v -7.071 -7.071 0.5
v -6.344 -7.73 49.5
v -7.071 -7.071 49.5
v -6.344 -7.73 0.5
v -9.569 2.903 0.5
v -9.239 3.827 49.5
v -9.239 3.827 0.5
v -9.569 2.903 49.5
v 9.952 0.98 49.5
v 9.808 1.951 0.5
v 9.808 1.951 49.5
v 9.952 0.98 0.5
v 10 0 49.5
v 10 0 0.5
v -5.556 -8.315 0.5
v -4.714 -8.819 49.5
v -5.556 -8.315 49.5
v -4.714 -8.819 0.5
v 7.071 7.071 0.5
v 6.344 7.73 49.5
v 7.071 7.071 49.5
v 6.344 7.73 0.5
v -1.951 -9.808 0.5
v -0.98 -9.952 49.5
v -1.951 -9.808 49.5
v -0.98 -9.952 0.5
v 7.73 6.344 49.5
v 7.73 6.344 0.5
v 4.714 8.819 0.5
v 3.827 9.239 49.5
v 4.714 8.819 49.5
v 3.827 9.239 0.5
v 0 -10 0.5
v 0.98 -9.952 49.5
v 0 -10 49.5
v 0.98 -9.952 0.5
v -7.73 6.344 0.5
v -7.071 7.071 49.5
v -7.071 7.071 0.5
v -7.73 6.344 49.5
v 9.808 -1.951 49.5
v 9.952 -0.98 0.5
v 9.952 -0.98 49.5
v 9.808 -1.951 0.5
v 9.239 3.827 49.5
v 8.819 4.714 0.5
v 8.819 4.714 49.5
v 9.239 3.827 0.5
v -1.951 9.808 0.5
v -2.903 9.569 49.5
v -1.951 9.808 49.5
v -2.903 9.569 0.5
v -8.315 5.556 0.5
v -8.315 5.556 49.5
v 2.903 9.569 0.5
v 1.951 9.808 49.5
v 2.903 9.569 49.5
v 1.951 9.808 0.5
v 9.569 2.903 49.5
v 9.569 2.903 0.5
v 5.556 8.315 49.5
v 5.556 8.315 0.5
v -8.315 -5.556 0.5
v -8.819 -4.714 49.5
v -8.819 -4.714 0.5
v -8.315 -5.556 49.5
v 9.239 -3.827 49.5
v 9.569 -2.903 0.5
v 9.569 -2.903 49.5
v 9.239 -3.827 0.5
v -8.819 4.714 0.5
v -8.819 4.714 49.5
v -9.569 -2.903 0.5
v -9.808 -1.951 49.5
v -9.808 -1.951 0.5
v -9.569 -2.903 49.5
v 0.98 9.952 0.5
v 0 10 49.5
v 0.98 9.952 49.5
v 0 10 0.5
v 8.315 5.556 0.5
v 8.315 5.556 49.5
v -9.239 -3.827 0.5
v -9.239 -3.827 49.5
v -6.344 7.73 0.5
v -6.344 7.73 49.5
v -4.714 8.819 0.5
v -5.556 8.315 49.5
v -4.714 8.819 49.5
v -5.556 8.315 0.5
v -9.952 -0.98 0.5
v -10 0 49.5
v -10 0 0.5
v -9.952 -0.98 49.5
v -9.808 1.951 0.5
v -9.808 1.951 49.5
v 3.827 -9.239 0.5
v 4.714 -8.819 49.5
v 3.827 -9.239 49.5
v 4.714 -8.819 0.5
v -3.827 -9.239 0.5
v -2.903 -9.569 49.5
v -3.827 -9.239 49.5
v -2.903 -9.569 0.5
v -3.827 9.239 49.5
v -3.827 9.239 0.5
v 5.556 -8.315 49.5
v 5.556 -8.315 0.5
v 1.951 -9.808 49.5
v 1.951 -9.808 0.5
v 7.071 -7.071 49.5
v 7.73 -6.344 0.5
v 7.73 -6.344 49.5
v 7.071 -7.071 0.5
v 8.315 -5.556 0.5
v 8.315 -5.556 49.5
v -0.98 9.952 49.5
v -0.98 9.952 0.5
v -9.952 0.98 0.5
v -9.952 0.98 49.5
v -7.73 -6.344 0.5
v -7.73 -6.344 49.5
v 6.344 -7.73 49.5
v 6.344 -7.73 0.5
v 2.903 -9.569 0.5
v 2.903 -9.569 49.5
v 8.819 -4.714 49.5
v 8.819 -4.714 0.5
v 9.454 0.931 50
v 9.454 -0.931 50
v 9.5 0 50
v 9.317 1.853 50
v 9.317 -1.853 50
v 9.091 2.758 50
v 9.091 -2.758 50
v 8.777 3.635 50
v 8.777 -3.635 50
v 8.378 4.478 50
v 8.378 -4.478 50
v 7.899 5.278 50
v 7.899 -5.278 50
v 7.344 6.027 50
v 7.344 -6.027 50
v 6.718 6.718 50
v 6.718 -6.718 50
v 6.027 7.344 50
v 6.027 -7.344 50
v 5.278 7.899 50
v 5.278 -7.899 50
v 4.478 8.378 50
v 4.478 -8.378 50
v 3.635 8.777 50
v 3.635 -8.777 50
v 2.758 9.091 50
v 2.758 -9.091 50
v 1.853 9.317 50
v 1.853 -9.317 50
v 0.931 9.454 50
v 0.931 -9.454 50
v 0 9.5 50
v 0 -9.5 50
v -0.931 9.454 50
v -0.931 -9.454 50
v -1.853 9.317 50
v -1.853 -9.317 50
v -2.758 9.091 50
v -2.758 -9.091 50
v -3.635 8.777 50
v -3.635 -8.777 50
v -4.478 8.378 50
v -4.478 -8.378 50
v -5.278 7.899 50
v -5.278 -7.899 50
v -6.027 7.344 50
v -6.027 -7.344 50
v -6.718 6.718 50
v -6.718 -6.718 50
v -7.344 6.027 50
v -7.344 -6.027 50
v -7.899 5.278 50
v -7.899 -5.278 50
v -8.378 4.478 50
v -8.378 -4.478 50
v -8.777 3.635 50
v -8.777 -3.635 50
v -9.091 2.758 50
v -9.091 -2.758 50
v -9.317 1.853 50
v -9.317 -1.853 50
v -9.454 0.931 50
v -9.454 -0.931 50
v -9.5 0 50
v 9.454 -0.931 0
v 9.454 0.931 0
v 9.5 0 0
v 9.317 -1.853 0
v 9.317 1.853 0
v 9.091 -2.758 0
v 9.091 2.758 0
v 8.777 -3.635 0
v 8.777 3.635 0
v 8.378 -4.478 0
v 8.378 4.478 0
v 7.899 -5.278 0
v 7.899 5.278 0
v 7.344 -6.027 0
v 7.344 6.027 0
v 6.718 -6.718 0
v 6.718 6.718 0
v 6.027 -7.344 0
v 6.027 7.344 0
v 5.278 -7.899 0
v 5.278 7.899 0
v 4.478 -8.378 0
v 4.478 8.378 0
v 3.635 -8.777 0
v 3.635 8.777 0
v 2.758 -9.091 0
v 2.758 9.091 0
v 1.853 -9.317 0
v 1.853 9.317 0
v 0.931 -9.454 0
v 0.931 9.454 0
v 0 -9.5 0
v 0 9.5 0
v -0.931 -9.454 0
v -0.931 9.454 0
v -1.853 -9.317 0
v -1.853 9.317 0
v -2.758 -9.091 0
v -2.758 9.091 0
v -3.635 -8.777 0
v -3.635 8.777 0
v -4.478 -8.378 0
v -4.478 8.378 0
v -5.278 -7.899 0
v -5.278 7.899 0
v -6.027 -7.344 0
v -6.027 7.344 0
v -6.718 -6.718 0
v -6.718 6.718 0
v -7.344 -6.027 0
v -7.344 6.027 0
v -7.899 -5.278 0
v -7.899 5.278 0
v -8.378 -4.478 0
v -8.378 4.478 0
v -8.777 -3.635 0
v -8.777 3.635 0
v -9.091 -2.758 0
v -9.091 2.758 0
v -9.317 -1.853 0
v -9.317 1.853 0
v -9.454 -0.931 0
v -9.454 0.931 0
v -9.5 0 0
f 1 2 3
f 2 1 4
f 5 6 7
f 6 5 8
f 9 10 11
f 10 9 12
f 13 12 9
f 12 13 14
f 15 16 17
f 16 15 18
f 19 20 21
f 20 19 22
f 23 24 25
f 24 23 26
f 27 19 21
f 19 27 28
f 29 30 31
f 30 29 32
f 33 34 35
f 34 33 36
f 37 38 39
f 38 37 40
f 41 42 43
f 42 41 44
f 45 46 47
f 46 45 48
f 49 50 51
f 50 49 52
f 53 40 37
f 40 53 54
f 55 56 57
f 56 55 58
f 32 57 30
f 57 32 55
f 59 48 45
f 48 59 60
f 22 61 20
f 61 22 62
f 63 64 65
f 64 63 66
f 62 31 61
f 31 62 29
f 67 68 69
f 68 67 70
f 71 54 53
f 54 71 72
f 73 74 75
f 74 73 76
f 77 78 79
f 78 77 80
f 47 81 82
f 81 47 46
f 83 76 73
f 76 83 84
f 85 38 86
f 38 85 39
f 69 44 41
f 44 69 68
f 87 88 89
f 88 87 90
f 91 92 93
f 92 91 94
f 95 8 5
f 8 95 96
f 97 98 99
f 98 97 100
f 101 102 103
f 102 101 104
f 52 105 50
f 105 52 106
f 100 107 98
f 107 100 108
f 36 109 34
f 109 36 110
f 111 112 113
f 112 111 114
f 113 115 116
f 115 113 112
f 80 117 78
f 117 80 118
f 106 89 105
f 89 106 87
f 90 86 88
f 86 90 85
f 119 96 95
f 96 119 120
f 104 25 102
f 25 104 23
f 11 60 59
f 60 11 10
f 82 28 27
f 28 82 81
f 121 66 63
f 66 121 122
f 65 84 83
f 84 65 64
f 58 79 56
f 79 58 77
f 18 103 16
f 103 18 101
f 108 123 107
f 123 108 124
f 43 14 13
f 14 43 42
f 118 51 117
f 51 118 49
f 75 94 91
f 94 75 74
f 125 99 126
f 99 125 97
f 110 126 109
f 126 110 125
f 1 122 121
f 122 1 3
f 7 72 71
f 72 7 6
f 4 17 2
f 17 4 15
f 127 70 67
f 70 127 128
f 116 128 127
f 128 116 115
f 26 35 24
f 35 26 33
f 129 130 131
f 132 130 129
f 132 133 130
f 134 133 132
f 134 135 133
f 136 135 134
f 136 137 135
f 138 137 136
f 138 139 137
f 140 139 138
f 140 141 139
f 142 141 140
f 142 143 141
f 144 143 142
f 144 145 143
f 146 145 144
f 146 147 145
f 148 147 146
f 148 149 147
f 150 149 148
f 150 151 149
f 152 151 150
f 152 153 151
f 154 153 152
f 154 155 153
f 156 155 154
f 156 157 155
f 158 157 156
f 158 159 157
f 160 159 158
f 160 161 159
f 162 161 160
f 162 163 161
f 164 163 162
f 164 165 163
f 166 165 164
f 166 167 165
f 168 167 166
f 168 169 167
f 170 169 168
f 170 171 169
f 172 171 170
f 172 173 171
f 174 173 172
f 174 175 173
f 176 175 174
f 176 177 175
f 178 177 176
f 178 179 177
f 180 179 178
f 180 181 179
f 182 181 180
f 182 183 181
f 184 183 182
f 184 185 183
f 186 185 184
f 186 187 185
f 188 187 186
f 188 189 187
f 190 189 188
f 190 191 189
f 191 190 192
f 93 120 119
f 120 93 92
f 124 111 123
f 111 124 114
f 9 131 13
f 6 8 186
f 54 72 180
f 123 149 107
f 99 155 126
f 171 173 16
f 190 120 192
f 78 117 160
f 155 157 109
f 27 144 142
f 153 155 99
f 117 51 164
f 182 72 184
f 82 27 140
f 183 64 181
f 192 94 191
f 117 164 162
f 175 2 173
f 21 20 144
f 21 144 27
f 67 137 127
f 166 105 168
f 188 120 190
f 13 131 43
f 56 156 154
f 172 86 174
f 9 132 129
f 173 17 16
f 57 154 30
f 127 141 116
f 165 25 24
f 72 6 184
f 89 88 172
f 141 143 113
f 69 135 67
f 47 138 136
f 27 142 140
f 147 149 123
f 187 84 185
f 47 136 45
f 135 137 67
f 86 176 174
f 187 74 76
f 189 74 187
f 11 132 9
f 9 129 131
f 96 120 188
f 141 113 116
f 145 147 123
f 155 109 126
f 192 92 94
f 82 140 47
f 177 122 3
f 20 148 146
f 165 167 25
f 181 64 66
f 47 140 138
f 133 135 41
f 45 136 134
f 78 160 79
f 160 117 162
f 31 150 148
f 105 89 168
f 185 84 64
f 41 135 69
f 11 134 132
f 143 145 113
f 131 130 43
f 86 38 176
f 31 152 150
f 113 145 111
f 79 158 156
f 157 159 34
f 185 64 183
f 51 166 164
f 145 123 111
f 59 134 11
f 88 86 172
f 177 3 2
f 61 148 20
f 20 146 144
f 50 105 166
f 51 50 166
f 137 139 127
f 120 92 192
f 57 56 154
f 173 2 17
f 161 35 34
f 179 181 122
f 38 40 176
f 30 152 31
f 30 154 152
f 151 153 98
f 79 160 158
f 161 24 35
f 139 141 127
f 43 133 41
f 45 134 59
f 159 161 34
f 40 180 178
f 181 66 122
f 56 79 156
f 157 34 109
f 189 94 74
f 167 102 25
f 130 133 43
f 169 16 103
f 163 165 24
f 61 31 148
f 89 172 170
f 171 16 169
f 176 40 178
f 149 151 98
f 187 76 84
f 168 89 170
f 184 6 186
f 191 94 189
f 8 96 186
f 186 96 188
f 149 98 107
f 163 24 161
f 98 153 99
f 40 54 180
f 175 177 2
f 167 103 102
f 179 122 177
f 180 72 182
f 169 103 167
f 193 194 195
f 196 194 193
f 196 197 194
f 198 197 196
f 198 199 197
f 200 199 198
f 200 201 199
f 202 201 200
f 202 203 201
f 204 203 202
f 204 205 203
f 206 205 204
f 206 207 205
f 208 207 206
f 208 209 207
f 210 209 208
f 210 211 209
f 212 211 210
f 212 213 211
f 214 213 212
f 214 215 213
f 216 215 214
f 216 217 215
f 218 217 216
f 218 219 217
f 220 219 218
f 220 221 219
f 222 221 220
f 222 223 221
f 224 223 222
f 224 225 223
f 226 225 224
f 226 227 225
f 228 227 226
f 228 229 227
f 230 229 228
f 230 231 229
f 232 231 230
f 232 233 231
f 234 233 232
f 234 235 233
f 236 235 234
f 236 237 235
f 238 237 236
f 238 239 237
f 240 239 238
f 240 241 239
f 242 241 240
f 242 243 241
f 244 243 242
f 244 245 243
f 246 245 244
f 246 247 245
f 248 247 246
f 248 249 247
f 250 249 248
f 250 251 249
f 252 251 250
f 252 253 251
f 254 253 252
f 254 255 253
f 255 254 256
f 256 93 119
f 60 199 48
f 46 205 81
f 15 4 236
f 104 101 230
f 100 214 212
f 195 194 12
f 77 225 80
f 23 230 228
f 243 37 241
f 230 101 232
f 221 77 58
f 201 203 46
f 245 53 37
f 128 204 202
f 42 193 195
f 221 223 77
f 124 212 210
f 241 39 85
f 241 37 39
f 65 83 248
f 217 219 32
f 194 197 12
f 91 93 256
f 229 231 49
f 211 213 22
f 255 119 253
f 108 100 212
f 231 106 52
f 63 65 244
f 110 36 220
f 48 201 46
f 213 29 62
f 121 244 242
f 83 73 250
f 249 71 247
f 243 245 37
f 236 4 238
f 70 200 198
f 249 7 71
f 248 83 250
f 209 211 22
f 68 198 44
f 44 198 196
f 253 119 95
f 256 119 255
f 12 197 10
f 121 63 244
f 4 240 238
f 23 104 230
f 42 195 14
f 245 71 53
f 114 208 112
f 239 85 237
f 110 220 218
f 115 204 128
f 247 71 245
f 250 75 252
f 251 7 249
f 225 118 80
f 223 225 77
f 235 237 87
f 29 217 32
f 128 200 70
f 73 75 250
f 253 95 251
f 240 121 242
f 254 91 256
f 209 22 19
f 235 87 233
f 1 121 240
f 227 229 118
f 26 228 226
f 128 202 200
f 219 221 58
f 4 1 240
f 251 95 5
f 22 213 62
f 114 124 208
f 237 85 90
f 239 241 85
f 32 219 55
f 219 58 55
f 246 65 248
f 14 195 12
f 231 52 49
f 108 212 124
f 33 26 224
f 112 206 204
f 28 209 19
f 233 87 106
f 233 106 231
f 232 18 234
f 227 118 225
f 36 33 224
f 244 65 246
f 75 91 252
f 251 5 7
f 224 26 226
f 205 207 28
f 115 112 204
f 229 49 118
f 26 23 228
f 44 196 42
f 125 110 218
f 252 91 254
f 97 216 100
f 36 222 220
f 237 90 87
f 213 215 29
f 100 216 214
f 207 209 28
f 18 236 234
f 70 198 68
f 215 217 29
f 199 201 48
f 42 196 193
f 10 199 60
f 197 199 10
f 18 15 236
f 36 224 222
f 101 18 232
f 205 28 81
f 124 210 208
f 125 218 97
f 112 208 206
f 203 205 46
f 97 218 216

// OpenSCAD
//This is a simple cylinder with camphered ends.

//Depending on usage and desired quality you may
//need to set the detail to a higher level than
//64, I recommend 128, 256, or 512.
detail=64;
$fn=detail;
//rotate([0,180,0]) cylcamfer(2,20,0,0,-2);


//To use just pass the height as first param,
//the radius as second parameter, and the height
//of the 45 degree camfer as the third.
ccyl(50,10,0.5);

module ccyl(h,r,c){
  difference(){
    cylinder(h=h,r=r);
    union(){
      cylcamfer(c,r,c,0,0,h-c);
      rotate([0,180,0]) cylcamfer(c,r,c,0,0,-c);
    }
  }
}
//


module cylcamfer(h,r,c,px,py,pz){
  translate([px,py,pz]){
    difference(){
      cylinder(h=h,r=r);
      cylinder(h=h,r1=r,r2=r-c);
    }
  }
} 
